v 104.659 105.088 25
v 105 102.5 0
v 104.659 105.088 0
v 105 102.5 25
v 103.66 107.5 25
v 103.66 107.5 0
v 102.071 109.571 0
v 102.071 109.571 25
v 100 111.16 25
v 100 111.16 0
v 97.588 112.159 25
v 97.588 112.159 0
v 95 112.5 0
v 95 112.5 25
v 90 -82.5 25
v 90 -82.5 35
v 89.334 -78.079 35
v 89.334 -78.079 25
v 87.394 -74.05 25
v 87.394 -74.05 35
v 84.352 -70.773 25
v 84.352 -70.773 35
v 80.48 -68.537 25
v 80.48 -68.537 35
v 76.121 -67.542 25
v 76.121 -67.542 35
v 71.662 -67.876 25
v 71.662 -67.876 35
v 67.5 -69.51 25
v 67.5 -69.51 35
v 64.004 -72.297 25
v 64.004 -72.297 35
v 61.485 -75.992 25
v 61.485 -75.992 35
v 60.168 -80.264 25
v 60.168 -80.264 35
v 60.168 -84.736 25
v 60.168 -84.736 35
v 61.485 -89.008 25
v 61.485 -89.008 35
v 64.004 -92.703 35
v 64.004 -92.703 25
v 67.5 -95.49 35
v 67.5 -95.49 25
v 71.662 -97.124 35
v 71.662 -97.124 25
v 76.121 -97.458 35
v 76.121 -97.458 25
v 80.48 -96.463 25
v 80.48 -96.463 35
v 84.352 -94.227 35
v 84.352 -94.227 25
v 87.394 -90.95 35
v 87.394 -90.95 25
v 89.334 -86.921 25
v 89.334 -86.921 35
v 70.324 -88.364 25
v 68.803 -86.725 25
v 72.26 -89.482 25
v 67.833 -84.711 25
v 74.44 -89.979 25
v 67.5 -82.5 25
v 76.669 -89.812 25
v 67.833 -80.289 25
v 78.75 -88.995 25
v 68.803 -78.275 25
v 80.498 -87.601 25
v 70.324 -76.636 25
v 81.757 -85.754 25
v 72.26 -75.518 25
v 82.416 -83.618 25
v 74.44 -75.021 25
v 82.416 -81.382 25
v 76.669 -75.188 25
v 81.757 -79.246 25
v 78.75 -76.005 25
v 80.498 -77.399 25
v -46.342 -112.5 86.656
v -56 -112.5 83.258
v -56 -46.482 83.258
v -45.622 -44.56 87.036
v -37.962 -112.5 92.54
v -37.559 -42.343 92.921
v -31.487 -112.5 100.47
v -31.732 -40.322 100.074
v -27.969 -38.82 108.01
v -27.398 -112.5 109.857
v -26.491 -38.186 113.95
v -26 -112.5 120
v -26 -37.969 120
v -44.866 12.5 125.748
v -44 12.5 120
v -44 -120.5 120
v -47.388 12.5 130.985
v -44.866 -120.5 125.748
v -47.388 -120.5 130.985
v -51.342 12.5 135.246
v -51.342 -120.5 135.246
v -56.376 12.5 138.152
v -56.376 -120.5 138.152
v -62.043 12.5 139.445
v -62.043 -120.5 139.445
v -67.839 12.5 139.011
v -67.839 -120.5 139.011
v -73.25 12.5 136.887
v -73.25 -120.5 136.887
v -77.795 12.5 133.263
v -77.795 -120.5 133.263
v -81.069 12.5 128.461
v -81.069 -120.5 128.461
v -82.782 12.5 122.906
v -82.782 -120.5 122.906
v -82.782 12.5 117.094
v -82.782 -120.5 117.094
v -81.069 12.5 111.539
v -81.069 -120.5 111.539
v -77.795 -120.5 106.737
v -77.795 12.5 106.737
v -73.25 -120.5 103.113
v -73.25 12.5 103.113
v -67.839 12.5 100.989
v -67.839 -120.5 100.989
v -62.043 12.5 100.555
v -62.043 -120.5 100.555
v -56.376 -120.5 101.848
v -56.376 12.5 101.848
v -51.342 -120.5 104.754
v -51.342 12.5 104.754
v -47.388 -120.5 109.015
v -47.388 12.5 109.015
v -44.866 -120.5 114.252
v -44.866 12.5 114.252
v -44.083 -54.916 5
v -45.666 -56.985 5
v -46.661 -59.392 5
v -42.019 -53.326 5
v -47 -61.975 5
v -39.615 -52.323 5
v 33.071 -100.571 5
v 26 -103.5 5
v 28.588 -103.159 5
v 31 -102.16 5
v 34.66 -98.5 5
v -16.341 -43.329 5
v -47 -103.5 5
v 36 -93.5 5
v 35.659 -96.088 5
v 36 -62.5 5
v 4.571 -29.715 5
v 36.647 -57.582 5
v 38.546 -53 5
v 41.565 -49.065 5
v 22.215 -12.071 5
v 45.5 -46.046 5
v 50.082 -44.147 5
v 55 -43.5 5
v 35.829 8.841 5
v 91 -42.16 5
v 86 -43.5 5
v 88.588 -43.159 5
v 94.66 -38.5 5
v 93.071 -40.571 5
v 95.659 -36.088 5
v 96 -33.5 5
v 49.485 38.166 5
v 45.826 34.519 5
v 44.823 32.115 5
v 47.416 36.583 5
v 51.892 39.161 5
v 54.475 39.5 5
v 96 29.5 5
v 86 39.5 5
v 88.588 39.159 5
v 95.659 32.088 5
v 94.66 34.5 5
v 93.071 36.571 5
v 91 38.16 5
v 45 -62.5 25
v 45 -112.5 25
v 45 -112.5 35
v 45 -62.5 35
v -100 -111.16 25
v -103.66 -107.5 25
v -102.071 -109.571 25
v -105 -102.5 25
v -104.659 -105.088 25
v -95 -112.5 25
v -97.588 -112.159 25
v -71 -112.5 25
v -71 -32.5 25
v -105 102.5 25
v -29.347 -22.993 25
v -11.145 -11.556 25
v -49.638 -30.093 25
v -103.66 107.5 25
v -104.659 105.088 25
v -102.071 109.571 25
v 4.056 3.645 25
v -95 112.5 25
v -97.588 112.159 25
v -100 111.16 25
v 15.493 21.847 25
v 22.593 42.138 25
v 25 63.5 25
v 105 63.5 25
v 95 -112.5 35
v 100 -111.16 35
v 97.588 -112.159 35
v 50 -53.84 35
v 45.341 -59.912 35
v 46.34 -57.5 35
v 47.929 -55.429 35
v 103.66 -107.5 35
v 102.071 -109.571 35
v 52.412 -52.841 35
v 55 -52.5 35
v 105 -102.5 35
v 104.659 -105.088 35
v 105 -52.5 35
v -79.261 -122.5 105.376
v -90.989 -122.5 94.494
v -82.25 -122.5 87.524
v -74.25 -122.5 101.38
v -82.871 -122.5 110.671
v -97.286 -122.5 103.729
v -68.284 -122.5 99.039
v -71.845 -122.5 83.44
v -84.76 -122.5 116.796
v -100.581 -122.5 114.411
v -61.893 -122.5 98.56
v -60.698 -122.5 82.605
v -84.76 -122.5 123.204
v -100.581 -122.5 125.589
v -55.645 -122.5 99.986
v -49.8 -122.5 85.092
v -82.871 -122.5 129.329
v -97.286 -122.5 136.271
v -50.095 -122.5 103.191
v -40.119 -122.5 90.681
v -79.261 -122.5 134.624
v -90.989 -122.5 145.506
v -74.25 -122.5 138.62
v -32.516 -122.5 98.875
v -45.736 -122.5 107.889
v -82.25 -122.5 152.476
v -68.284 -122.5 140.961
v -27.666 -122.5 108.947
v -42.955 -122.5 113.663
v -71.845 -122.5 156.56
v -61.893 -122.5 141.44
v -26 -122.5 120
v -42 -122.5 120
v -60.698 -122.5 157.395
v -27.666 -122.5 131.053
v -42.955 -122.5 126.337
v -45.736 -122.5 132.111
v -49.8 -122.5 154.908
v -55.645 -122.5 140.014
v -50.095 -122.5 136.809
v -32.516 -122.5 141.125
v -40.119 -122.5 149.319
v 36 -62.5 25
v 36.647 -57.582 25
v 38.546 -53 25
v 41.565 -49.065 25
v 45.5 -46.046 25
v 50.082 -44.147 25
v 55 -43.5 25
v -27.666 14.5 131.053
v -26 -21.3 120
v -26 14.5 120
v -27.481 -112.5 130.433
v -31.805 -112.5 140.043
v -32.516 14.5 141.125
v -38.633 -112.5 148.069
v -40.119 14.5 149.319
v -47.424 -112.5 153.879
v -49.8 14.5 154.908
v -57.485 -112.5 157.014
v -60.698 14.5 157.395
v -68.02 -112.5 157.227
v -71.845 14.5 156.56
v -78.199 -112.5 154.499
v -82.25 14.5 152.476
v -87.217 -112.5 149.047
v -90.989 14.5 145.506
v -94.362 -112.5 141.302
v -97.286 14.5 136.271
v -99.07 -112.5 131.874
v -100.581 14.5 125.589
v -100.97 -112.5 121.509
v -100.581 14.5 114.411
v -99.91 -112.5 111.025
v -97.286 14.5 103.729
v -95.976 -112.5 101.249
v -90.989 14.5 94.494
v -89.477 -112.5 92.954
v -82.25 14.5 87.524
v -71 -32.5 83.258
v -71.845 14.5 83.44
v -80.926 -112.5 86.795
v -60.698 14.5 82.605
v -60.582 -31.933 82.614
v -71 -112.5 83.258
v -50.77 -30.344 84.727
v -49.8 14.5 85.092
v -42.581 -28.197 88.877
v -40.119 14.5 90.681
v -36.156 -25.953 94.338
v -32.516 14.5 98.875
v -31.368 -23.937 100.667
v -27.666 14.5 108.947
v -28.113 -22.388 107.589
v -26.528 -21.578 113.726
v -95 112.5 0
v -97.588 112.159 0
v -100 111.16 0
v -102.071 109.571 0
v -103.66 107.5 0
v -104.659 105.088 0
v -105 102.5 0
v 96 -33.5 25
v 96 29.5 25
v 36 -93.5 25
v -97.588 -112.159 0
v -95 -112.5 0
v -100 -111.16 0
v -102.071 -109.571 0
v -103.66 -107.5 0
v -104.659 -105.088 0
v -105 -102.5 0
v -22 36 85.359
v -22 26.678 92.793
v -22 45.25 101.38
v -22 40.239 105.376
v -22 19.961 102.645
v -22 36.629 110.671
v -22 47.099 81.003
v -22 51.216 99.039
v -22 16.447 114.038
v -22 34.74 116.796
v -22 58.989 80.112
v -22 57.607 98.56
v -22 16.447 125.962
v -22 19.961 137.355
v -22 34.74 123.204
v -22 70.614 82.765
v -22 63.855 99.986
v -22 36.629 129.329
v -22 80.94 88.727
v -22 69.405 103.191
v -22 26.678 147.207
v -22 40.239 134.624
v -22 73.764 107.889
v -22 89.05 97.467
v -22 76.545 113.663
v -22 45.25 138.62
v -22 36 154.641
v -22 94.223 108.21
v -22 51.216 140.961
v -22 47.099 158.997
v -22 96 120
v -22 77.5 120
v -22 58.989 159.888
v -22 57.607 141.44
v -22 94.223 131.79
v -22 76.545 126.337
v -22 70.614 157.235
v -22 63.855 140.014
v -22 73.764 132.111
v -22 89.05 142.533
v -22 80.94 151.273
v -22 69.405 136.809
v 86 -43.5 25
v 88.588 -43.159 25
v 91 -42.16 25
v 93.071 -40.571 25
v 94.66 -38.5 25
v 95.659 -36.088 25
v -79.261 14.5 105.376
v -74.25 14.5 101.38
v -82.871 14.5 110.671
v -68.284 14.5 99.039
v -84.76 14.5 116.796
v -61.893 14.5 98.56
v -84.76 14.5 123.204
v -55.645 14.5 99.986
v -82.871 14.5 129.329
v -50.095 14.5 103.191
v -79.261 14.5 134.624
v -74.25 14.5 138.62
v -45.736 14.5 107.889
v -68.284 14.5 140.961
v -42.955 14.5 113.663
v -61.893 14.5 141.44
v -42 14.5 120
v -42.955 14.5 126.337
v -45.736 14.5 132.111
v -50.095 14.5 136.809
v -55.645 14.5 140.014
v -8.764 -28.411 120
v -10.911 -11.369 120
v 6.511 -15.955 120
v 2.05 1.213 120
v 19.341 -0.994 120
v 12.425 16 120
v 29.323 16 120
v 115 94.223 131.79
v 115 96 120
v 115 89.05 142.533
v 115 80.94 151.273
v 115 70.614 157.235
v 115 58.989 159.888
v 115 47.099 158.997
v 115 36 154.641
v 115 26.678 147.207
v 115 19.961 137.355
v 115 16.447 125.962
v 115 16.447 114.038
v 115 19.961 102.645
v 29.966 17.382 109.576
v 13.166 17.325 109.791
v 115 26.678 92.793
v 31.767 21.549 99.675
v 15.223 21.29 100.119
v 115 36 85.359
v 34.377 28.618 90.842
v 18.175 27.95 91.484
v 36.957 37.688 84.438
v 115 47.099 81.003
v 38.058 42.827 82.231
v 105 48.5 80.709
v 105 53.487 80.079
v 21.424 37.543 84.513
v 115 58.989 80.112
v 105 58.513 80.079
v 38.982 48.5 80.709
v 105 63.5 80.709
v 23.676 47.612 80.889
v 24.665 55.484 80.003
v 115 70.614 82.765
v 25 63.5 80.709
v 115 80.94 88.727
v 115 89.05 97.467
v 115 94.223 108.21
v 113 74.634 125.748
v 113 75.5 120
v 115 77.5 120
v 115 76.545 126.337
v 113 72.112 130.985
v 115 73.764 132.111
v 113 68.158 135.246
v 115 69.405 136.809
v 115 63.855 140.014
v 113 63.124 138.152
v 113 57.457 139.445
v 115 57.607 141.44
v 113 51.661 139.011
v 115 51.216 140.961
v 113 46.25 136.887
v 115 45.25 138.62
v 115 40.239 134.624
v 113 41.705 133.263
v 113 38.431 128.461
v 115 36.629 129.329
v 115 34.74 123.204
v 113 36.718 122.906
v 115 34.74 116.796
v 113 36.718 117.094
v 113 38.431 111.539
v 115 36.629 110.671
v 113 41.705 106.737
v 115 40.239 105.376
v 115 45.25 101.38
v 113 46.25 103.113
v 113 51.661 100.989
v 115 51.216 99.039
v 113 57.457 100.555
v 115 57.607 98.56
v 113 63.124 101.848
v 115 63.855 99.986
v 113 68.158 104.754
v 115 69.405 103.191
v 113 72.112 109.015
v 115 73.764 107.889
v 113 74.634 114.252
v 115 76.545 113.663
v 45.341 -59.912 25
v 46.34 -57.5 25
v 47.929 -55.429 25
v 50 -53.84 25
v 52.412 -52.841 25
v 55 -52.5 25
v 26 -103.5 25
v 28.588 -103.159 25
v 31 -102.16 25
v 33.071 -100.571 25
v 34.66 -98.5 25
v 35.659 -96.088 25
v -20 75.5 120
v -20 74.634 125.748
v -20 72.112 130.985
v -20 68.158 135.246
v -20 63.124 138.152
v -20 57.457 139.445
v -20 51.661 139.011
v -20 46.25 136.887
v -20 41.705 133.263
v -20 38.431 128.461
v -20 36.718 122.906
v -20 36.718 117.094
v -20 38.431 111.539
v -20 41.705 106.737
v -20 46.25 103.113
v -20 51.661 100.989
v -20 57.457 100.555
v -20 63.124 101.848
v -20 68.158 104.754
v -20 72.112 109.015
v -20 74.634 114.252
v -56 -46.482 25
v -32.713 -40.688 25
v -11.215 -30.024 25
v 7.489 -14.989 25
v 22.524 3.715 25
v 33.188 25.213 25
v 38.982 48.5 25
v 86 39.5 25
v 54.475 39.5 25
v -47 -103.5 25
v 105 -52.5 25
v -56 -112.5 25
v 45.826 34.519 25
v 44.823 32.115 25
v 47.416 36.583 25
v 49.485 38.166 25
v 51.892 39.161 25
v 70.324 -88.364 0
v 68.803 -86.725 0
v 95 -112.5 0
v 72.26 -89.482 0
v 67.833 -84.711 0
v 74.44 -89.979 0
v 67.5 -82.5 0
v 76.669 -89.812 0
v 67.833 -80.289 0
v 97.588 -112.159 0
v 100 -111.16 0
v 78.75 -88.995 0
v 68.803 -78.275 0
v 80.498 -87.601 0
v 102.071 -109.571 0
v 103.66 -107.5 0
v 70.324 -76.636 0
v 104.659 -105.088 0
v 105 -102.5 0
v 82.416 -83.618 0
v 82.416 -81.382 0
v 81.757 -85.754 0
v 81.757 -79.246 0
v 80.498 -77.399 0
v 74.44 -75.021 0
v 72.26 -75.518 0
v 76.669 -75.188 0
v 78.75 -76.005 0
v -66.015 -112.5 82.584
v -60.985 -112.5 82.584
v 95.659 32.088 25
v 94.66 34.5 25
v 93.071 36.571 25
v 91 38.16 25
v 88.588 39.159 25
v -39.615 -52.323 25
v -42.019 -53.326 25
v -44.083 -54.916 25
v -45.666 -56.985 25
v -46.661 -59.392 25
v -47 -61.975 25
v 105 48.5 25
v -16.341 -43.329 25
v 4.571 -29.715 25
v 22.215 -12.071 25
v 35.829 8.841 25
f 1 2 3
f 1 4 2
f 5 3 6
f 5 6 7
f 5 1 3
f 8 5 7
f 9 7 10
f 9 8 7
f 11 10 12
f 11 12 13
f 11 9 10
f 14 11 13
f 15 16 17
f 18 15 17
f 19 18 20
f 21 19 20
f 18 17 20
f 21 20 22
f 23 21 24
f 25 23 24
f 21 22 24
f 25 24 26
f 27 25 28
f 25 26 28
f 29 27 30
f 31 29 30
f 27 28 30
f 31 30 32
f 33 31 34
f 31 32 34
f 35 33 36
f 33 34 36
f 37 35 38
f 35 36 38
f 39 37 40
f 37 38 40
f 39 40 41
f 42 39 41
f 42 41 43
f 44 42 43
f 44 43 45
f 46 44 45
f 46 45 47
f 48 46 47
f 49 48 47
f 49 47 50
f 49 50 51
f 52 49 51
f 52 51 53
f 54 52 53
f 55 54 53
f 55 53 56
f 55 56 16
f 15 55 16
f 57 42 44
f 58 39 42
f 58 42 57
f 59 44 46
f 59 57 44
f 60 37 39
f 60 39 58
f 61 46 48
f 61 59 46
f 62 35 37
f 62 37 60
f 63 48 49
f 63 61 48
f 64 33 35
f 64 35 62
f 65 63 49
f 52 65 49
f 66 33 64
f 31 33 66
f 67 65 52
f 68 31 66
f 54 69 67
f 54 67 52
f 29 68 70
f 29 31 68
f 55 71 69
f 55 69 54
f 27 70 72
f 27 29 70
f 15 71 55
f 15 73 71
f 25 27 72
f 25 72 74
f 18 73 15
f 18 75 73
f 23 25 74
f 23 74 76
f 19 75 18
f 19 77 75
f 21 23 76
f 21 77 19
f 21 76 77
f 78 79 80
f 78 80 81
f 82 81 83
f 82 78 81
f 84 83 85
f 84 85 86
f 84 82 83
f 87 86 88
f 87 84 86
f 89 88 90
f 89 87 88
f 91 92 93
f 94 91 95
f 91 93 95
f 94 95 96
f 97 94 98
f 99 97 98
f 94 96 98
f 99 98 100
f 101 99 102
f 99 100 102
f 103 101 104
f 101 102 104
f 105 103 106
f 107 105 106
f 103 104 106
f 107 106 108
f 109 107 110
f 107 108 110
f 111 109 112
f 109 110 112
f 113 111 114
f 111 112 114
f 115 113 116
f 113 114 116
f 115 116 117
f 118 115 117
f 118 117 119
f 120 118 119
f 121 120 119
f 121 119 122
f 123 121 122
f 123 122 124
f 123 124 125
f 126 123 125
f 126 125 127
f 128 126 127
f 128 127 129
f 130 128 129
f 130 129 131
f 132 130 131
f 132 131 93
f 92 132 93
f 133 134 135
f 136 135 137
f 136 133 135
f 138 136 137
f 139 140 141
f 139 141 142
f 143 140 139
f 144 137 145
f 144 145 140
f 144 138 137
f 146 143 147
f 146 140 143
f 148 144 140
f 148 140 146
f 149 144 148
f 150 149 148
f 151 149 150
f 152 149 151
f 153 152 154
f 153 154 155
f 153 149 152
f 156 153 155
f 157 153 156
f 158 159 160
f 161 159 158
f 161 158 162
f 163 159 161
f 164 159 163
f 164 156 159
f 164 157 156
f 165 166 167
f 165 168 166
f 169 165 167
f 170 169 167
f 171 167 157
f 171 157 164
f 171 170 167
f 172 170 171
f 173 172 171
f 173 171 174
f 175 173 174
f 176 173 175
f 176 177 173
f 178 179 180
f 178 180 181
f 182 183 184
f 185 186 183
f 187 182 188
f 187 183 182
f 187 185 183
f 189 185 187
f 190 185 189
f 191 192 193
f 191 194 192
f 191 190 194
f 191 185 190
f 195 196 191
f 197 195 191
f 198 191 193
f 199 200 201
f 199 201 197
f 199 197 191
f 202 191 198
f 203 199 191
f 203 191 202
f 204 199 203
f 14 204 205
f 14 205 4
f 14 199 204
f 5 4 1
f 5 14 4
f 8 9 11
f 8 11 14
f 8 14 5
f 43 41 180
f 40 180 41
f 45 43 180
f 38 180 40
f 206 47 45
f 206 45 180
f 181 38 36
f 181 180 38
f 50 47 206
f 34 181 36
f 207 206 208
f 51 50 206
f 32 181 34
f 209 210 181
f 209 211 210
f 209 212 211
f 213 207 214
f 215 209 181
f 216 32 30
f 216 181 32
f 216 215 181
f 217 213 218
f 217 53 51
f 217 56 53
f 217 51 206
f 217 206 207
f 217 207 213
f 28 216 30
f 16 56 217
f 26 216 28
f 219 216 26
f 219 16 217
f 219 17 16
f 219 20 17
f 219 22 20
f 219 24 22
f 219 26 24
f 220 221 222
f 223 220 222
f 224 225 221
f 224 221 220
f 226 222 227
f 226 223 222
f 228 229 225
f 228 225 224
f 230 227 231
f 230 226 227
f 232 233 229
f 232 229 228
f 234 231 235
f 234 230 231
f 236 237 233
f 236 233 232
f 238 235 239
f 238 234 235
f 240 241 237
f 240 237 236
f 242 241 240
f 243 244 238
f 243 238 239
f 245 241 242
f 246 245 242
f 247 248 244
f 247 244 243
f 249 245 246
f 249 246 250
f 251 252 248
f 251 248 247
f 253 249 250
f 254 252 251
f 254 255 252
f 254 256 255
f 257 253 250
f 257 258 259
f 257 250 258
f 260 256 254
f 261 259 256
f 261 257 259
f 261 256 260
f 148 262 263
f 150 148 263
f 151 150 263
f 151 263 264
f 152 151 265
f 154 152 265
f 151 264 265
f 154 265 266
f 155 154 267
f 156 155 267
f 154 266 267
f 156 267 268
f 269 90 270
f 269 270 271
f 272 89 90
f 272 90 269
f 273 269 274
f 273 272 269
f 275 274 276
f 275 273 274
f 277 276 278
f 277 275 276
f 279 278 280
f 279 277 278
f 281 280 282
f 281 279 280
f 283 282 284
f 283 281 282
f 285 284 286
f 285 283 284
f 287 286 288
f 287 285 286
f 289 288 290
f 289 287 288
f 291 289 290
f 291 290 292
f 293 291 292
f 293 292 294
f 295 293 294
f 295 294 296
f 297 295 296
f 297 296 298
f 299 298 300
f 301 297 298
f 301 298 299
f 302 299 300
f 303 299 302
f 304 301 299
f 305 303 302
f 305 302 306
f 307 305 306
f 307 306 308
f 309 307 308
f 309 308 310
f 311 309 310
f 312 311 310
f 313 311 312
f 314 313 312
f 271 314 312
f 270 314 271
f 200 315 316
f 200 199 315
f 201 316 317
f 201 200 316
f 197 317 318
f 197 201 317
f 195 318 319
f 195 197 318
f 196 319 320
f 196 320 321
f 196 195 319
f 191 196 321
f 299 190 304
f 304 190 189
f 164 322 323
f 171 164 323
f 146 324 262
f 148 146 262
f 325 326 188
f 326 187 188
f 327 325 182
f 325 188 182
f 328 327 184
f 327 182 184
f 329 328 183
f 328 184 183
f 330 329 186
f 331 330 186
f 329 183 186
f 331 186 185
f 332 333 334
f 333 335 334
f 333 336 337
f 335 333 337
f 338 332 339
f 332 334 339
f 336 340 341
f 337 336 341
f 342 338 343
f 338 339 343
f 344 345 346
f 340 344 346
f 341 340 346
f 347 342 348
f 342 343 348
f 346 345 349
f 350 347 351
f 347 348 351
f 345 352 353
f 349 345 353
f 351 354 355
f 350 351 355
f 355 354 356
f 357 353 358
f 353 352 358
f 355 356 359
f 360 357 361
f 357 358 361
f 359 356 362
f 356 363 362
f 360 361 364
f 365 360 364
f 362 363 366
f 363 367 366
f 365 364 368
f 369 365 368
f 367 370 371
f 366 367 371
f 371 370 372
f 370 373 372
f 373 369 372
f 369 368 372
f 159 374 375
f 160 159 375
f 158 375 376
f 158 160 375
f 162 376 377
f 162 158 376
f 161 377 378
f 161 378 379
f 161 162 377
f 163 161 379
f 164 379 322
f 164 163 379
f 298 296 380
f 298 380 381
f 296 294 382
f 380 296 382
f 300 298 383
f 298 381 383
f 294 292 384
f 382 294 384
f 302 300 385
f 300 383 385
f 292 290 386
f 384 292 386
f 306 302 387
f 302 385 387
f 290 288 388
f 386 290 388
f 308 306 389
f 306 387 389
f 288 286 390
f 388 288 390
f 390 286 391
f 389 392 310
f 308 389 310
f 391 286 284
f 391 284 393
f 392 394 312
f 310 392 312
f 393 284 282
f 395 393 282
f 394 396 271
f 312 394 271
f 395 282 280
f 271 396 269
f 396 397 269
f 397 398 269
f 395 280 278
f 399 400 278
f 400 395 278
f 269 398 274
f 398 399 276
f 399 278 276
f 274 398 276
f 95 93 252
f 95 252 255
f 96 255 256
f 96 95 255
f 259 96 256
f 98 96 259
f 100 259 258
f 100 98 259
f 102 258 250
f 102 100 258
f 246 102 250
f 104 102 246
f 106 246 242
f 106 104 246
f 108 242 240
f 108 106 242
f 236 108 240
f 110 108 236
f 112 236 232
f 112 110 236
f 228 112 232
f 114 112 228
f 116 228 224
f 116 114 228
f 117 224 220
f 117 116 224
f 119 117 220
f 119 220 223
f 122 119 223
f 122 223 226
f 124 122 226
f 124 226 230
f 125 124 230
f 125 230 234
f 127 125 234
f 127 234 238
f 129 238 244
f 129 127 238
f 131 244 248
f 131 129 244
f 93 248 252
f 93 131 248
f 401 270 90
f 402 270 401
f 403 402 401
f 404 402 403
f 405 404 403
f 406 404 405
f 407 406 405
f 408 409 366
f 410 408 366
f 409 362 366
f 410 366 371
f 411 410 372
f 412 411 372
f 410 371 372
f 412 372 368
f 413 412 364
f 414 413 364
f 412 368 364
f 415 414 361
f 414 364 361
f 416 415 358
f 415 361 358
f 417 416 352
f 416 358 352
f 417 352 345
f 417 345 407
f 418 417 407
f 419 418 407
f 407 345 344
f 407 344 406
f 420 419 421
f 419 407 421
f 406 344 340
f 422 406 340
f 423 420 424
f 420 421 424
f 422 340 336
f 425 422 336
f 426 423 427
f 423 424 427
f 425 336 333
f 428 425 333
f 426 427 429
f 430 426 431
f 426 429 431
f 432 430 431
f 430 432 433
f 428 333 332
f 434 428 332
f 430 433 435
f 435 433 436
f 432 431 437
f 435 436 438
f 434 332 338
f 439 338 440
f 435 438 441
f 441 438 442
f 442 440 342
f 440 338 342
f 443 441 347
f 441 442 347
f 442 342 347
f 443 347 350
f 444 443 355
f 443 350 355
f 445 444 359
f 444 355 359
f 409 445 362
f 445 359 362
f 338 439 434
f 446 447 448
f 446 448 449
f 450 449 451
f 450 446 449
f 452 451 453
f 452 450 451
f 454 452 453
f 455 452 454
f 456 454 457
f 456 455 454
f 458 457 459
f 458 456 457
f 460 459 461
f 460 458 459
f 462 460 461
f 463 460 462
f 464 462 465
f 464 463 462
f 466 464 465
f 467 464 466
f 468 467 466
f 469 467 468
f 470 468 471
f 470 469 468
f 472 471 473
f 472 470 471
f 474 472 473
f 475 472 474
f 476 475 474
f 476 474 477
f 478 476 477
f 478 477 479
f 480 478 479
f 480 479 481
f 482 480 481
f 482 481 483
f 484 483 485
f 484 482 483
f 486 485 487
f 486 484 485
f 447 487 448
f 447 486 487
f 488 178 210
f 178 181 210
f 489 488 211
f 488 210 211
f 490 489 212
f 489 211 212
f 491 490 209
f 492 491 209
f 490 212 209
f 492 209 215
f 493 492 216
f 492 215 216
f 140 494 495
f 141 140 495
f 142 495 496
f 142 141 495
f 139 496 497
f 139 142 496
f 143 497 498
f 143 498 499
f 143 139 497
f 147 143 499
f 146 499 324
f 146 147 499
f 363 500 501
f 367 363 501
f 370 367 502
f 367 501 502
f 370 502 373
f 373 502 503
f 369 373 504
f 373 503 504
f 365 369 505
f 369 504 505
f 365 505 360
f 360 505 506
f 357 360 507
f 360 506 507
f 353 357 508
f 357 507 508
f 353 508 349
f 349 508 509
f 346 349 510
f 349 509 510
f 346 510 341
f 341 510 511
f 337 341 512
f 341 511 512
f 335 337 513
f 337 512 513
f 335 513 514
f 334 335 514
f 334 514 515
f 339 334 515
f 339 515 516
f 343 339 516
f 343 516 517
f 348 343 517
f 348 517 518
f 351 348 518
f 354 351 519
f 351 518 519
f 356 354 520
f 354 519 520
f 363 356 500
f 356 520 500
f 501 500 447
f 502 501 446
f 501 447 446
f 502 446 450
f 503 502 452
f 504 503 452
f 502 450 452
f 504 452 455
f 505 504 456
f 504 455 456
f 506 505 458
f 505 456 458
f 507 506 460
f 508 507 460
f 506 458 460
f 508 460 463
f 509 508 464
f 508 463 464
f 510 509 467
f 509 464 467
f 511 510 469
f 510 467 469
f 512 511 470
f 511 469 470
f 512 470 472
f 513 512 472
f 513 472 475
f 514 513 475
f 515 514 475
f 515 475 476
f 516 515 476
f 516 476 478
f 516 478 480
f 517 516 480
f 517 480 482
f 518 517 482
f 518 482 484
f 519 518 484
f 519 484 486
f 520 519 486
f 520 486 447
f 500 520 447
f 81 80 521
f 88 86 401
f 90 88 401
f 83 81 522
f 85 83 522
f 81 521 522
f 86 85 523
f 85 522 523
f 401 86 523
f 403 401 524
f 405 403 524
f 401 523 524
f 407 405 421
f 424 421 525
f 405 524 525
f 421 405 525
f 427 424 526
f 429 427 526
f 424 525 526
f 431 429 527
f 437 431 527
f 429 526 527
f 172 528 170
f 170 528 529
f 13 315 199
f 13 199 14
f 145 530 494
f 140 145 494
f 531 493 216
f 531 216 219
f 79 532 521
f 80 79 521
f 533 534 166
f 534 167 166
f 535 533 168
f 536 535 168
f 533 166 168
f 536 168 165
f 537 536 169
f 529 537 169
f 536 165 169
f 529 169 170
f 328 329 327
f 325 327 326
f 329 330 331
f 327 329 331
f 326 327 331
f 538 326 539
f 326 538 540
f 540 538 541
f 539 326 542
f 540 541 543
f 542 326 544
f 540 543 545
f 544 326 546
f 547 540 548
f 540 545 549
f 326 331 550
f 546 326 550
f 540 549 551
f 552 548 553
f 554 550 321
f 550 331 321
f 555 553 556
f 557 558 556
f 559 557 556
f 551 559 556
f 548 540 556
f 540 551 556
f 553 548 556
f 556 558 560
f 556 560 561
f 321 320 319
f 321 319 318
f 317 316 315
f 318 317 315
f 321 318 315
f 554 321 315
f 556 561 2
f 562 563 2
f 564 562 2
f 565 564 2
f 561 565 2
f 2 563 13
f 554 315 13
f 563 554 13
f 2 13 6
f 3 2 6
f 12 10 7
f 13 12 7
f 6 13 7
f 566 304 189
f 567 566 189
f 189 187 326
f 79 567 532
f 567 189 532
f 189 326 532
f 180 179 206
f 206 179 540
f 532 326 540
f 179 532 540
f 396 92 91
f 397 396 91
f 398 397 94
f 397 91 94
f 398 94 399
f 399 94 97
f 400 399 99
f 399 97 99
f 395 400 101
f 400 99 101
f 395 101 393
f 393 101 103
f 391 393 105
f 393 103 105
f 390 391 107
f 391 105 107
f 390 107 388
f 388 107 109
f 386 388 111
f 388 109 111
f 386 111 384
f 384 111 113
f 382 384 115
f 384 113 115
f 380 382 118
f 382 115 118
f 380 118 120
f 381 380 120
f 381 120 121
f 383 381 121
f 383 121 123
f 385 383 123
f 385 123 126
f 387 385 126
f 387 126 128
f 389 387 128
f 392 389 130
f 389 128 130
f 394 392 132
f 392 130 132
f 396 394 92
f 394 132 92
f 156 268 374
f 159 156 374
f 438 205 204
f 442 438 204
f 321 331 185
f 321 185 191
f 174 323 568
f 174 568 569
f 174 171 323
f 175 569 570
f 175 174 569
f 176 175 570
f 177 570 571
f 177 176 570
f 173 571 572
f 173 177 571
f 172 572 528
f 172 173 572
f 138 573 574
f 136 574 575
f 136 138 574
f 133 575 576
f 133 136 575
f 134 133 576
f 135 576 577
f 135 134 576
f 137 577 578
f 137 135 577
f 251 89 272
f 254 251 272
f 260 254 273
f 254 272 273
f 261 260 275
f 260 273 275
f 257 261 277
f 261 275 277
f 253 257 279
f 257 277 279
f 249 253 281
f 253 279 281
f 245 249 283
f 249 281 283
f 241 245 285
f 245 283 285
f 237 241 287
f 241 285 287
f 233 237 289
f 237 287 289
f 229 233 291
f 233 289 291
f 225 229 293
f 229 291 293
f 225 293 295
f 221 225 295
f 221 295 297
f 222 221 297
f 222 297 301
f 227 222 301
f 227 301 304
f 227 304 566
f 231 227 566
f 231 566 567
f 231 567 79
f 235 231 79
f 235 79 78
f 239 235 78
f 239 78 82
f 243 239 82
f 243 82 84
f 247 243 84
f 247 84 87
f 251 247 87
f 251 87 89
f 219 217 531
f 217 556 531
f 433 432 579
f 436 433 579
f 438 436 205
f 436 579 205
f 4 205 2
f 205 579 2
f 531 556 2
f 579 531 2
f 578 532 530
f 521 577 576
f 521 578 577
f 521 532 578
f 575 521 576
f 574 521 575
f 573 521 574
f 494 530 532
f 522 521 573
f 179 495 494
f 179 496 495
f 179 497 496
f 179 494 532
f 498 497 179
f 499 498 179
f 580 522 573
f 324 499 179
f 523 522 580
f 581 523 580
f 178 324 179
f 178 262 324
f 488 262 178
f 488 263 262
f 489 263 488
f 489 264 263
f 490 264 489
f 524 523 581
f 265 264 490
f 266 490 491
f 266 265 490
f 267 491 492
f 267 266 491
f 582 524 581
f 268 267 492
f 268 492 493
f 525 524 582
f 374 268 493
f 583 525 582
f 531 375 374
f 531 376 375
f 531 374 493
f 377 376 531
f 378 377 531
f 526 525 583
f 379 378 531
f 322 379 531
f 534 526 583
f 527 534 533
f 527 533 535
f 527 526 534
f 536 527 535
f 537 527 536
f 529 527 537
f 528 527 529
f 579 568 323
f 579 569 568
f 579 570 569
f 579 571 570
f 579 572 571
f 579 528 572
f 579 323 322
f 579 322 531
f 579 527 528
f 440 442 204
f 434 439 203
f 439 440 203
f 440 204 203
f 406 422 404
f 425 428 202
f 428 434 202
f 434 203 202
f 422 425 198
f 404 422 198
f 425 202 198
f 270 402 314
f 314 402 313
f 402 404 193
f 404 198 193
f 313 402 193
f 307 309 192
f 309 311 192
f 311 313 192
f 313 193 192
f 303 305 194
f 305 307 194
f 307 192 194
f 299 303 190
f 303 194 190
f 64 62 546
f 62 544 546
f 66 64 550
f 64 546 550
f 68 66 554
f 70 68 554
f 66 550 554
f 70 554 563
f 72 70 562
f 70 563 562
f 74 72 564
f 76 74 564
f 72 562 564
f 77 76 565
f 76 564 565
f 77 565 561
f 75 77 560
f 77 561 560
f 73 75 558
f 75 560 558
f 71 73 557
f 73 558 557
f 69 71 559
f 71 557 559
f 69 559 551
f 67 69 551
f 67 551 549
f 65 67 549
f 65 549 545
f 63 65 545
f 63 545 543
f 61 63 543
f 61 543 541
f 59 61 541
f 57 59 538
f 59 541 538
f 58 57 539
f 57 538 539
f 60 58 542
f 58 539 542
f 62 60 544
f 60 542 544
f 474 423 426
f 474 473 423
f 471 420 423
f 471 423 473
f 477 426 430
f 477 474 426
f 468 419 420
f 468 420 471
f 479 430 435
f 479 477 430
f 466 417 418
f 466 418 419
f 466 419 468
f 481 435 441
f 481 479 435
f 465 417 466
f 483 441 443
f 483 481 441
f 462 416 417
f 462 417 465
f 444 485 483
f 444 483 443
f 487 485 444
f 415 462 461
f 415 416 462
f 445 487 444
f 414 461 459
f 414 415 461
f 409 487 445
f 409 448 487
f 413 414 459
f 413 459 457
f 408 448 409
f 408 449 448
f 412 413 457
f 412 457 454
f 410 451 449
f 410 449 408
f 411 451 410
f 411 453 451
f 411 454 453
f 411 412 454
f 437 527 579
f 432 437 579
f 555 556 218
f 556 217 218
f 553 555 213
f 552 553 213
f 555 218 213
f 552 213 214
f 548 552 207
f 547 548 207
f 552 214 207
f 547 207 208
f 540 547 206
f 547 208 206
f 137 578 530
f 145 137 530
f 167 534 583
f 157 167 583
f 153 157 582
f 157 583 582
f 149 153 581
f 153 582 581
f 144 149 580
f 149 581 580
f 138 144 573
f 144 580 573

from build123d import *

# Parameters (mm, degrees)
F0_W            = 210
F0_H            = 225
F1_DEPTH        = 25
F3_DEPTH        = 95
F4_R            = 37.5
F5_DEPTH        = 10
F5_DEPTH_BACK   = 127
F6_R            = 40
F7_DEPTH        = 10
F7_DEPTH_BACK   = 127
F8_W            = 60
F8_H            = 60
F9_DEPTH        = 10
F10_R           = 10
F12_DEPTH       = 20
F14_D           = 15
F14_CBORE_D     = 30
F14_CBORE_DEPTH = 10
F15_R           = 10
F16_R           = 19.5
F17_DEPTH       = 235.001
F18_R           = 19.5
F19_DEPTH       = 220.001
F20_SIZE        = 2
F21_R           = 10


with BuildPart() as f1:
    # F0 (on Top) → F1 (new body)
    with BuildSketch(Plane.XY):
        Rectangle(F0_W, F0_H)
    extrude(amount=F1_DEPTH)

    # F2 (on face) → F3 (join)
    with BuildSketch(Plane.XY.offset(25)):
        with BuildLine():
            Line((-71, -32.5), (-71, -112.5))
            Line((-71, -112.5), (-56, -112.5))
            Line((-56, -112.5), (-56, -46.481817))
            ThreePointArc((-56, -46.481817), (7.488853, -14.988853), (38.981817, 48.5))
            Line((38.981817, 48.5), (105, 48.5))
            Line((105, 48.5), (105, 63.5))
            Line((105, 63.5), (25, 63.5))
            ThreePointArc((25, 63.5), (-3.117749, -4.382251), (-71, -32.5))
        make_face()
    extrude(amount=F3_DEPTH)

    # F4 (on face) → F5 (join, two sides)
    with BuildSketch(Plane.XZ.offset(112.5)) as f5_sk:
        with Locations((-63.5, 120)):
            Circle(F4_R)
    extrude(amount=F5_DEPTH)
    extrude(f5_sk.sketch, amount=-F5_DEPTH_BACK)

    # F6 (on face) → F7 (join, two sides)
    with BuildSketch(Plane.YZ.offset(105)) as f7_sk:
        with Locations((56, 120)):
            Circle(F6_R)
    extrude(amount=F7_DEPTH)
    extrude(f7_sk.sketch, amount=-F7_DEPTH_BACK)

    # F8 (on face) → F9 (join)
    with BuildSketch(Plane.XY.offset(25)):
        with Locations((75, -82.5)):
            Rectangle(F8_W, F8_H)
    extrude(amount=F9_DEPTH)

    # F10
    f10_edges = [f1.edges().sort_by_distance(p)[0] for p in [
        (45, -52.5, 30),
    ]]
    fillet(f10_edges, radius=F10_R)

    # F11 (on face) → F12 (cut)
    with BuildSketch(Plane.XY.offset(25)):
        with BuildLine():
            ThreePointArc((46.575508, 39.5), (13.852814, -21.352814), (-47, -54.075508))
            Line((-47, -54.075508), (-47, -103.5))
            Line((-47, -103.5), (36, -103.5))
            Line((36, -103.5), (36, -62.5))
            ThreePointArc((36, -62.5), (41.564971, -49.064971), (55, -43.5))
            Line((55, -43.5), (96, -43.5))
            Line((96, -43.5), (96, 39.5))
            Line((96, 39.5), (46.575508, 39.5))
        make_face()
    extrude(amount=-F12_DEPTH, mode=Mode.SUBTRACT)

    # F14 (through all)
    with Locations(Plane.XY.offset(35)):
        with Locations((75, -82.5)):
            CounterBoreHole(F14_D / 2, F14_CBORE_D / 2, F14_CBORE_DEPTH)

    # F15
    f15_edges = [f1.edges().sort_by_distance(p)[0] for p in [
        (-47, -54.075508, 15),
        (46.575508, 39.5, 15),
        (96, 39.5, 15),
        (36, -103.5, 15),
        (96, -43.5, 15),
    ]]
    fillet(f15_edges, radius=F15_R)

    # F16 (on face) → F17 (cut, through all)
    with BuildSketch(Plane.XZ.offset(122.5)):
        with Locations((-63.5, 120)):
            Circle(F16_R)
    extrude(amount=-F17_DEPTH, mode=Mode.SUBTRACT)

    # F18 (on face) → F19 (cut, through all)
    with BuildSketch(Plane.YZ.offset(115)):
        with Locations((56, 120)):
            Circle(F18_R)
    extrude(amount=-F19_DEPTH, mode=Mode.SUBTRACT)

    # F20
    f20_edges = [f1.edges().sort_by_distance(p)[0] for p in [
        (-83, -122.5, 120),
        (115, 36.5, 120),
        (-83, 14.5, 120),
        (-22, 36.5, 120),
    ]]
    chamfer(f20_edges, length=F20_SIZE)

    # F21
    f21_edges = [f1.edges().sort_by_distance(p)[0] for p in [
        (105, -112.5, 17.5),
        (-105, -112.5, 12.5),
        (105, 112.5, 12.5),
        (-105, 112.5, 12.5),
    ]]
    fillet(f21_edges, radius=F21_R)


solid = f1.part
